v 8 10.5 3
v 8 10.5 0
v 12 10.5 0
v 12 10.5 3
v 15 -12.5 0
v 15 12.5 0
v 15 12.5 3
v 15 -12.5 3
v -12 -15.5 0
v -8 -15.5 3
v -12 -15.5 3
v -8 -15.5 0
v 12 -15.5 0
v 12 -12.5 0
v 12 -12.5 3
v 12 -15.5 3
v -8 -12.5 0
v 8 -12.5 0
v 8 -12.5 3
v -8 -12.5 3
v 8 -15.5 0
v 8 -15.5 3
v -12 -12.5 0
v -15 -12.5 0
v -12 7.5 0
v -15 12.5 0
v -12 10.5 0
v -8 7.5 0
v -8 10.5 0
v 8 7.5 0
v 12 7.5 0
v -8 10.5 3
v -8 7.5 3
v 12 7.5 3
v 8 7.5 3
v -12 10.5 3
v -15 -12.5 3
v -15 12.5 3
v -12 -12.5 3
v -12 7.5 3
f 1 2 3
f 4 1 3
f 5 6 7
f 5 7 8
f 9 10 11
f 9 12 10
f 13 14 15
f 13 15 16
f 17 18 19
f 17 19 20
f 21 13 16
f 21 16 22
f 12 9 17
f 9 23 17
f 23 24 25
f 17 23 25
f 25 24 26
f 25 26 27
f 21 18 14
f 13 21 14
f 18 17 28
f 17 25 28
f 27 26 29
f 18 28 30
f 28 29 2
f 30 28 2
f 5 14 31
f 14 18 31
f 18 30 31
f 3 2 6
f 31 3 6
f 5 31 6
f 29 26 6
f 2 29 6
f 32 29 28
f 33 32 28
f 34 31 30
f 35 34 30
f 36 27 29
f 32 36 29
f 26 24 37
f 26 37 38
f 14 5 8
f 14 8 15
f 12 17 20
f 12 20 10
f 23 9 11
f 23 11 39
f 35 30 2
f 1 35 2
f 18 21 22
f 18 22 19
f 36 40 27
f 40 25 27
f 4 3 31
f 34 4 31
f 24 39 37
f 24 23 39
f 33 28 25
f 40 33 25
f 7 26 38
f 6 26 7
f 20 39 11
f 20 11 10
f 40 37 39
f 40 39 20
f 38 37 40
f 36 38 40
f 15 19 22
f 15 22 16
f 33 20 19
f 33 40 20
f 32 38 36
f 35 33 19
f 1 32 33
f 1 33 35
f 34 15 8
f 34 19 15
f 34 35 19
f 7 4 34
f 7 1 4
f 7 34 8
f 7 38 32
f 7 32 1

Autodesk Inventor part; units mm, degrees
ref_plane "YZ Plane" through (0, 0, 0) normal (1, 0, 0) x (0, 1, 0)
ref_plane "XZ Plane" through (0, 0, 0) normal (0, 1, 0) x (-1, 0, 0)
ref_plane "XY Plane" through (0, 0, 0) normal (0, 0, 1) x (1, 0, 0)
sketch "Sketch1" plane through (0, 0, 0) normal (0, 0, 1) x (1, 0, 0)
  line L0 (-15, 12.5) -> (15, 12.5)
  line L1 (15, 12.5) -> (15, -12.5)
  line L2 (15, -12.5) -> (-15, -12.5)
  line L3 (-15, -12.5) -> (-15, 12.5)
  line L4 (-12, 10.5) -> (-8, 10.5)
  line L5 (-8, 10.5) -> (-8, 7.5)
  line L6 (-8, 7.5) -> (-12, 7.5)
  line L7 (-12, 7.5) -> (-12, 10.5)
  line L8 (8, 10.5) -> (12, 10.5)
  line L9 (12, 10.5) -> (12, 7.5)
  line L10 (12, 7.5) -> (8, 7.5)
  line L11 (8, 7.5) -> (8, 10.5)
  line L12 (-12, -12.5) -> (-8, -12.5)
  line L13 (-8, -12.5) -> (-8, -15.5)
  line L14 (-8, -15.5) -> (-12, -15.5)
  line L15 (-12, -15.5) -> (-12, -12.5)
  line L16 (8, -12.5) -> (12, -12.5)
  line L17 (12, -12.5) -> (12, -15.5)
  line L18 (12, -15.5) -> (8, -15.5)
  line L19 (8, -15.5) -> (8, -12.5)
  point P0 (0, 0)
  point P1 (0, 12.5)
  point P2 (15, 0)
  point P3 (-10, -12.5)
  point P4 (0, -12.5)
  point P5 (10, -12.5)
  point P6 (-10, 10.5)
  point P7 (10, 10.5)
  dimension "d0" = 25
  dimension "d1" = 30
  dimension "d2" = 4
  dimension "d3" = 3
  dimension "d4" = 3
  dimension "d5" = 4
  dimension "d6" = 10
  dimension "d7" = 10
  dimension "d8" = 10
  dimension "d9" = 10
  dimension "d10" = 20
extrude "Extrusion1" add sketch "Sketch1" along normal blind 3
properties material "MDF Medium Density Fiberboard"
